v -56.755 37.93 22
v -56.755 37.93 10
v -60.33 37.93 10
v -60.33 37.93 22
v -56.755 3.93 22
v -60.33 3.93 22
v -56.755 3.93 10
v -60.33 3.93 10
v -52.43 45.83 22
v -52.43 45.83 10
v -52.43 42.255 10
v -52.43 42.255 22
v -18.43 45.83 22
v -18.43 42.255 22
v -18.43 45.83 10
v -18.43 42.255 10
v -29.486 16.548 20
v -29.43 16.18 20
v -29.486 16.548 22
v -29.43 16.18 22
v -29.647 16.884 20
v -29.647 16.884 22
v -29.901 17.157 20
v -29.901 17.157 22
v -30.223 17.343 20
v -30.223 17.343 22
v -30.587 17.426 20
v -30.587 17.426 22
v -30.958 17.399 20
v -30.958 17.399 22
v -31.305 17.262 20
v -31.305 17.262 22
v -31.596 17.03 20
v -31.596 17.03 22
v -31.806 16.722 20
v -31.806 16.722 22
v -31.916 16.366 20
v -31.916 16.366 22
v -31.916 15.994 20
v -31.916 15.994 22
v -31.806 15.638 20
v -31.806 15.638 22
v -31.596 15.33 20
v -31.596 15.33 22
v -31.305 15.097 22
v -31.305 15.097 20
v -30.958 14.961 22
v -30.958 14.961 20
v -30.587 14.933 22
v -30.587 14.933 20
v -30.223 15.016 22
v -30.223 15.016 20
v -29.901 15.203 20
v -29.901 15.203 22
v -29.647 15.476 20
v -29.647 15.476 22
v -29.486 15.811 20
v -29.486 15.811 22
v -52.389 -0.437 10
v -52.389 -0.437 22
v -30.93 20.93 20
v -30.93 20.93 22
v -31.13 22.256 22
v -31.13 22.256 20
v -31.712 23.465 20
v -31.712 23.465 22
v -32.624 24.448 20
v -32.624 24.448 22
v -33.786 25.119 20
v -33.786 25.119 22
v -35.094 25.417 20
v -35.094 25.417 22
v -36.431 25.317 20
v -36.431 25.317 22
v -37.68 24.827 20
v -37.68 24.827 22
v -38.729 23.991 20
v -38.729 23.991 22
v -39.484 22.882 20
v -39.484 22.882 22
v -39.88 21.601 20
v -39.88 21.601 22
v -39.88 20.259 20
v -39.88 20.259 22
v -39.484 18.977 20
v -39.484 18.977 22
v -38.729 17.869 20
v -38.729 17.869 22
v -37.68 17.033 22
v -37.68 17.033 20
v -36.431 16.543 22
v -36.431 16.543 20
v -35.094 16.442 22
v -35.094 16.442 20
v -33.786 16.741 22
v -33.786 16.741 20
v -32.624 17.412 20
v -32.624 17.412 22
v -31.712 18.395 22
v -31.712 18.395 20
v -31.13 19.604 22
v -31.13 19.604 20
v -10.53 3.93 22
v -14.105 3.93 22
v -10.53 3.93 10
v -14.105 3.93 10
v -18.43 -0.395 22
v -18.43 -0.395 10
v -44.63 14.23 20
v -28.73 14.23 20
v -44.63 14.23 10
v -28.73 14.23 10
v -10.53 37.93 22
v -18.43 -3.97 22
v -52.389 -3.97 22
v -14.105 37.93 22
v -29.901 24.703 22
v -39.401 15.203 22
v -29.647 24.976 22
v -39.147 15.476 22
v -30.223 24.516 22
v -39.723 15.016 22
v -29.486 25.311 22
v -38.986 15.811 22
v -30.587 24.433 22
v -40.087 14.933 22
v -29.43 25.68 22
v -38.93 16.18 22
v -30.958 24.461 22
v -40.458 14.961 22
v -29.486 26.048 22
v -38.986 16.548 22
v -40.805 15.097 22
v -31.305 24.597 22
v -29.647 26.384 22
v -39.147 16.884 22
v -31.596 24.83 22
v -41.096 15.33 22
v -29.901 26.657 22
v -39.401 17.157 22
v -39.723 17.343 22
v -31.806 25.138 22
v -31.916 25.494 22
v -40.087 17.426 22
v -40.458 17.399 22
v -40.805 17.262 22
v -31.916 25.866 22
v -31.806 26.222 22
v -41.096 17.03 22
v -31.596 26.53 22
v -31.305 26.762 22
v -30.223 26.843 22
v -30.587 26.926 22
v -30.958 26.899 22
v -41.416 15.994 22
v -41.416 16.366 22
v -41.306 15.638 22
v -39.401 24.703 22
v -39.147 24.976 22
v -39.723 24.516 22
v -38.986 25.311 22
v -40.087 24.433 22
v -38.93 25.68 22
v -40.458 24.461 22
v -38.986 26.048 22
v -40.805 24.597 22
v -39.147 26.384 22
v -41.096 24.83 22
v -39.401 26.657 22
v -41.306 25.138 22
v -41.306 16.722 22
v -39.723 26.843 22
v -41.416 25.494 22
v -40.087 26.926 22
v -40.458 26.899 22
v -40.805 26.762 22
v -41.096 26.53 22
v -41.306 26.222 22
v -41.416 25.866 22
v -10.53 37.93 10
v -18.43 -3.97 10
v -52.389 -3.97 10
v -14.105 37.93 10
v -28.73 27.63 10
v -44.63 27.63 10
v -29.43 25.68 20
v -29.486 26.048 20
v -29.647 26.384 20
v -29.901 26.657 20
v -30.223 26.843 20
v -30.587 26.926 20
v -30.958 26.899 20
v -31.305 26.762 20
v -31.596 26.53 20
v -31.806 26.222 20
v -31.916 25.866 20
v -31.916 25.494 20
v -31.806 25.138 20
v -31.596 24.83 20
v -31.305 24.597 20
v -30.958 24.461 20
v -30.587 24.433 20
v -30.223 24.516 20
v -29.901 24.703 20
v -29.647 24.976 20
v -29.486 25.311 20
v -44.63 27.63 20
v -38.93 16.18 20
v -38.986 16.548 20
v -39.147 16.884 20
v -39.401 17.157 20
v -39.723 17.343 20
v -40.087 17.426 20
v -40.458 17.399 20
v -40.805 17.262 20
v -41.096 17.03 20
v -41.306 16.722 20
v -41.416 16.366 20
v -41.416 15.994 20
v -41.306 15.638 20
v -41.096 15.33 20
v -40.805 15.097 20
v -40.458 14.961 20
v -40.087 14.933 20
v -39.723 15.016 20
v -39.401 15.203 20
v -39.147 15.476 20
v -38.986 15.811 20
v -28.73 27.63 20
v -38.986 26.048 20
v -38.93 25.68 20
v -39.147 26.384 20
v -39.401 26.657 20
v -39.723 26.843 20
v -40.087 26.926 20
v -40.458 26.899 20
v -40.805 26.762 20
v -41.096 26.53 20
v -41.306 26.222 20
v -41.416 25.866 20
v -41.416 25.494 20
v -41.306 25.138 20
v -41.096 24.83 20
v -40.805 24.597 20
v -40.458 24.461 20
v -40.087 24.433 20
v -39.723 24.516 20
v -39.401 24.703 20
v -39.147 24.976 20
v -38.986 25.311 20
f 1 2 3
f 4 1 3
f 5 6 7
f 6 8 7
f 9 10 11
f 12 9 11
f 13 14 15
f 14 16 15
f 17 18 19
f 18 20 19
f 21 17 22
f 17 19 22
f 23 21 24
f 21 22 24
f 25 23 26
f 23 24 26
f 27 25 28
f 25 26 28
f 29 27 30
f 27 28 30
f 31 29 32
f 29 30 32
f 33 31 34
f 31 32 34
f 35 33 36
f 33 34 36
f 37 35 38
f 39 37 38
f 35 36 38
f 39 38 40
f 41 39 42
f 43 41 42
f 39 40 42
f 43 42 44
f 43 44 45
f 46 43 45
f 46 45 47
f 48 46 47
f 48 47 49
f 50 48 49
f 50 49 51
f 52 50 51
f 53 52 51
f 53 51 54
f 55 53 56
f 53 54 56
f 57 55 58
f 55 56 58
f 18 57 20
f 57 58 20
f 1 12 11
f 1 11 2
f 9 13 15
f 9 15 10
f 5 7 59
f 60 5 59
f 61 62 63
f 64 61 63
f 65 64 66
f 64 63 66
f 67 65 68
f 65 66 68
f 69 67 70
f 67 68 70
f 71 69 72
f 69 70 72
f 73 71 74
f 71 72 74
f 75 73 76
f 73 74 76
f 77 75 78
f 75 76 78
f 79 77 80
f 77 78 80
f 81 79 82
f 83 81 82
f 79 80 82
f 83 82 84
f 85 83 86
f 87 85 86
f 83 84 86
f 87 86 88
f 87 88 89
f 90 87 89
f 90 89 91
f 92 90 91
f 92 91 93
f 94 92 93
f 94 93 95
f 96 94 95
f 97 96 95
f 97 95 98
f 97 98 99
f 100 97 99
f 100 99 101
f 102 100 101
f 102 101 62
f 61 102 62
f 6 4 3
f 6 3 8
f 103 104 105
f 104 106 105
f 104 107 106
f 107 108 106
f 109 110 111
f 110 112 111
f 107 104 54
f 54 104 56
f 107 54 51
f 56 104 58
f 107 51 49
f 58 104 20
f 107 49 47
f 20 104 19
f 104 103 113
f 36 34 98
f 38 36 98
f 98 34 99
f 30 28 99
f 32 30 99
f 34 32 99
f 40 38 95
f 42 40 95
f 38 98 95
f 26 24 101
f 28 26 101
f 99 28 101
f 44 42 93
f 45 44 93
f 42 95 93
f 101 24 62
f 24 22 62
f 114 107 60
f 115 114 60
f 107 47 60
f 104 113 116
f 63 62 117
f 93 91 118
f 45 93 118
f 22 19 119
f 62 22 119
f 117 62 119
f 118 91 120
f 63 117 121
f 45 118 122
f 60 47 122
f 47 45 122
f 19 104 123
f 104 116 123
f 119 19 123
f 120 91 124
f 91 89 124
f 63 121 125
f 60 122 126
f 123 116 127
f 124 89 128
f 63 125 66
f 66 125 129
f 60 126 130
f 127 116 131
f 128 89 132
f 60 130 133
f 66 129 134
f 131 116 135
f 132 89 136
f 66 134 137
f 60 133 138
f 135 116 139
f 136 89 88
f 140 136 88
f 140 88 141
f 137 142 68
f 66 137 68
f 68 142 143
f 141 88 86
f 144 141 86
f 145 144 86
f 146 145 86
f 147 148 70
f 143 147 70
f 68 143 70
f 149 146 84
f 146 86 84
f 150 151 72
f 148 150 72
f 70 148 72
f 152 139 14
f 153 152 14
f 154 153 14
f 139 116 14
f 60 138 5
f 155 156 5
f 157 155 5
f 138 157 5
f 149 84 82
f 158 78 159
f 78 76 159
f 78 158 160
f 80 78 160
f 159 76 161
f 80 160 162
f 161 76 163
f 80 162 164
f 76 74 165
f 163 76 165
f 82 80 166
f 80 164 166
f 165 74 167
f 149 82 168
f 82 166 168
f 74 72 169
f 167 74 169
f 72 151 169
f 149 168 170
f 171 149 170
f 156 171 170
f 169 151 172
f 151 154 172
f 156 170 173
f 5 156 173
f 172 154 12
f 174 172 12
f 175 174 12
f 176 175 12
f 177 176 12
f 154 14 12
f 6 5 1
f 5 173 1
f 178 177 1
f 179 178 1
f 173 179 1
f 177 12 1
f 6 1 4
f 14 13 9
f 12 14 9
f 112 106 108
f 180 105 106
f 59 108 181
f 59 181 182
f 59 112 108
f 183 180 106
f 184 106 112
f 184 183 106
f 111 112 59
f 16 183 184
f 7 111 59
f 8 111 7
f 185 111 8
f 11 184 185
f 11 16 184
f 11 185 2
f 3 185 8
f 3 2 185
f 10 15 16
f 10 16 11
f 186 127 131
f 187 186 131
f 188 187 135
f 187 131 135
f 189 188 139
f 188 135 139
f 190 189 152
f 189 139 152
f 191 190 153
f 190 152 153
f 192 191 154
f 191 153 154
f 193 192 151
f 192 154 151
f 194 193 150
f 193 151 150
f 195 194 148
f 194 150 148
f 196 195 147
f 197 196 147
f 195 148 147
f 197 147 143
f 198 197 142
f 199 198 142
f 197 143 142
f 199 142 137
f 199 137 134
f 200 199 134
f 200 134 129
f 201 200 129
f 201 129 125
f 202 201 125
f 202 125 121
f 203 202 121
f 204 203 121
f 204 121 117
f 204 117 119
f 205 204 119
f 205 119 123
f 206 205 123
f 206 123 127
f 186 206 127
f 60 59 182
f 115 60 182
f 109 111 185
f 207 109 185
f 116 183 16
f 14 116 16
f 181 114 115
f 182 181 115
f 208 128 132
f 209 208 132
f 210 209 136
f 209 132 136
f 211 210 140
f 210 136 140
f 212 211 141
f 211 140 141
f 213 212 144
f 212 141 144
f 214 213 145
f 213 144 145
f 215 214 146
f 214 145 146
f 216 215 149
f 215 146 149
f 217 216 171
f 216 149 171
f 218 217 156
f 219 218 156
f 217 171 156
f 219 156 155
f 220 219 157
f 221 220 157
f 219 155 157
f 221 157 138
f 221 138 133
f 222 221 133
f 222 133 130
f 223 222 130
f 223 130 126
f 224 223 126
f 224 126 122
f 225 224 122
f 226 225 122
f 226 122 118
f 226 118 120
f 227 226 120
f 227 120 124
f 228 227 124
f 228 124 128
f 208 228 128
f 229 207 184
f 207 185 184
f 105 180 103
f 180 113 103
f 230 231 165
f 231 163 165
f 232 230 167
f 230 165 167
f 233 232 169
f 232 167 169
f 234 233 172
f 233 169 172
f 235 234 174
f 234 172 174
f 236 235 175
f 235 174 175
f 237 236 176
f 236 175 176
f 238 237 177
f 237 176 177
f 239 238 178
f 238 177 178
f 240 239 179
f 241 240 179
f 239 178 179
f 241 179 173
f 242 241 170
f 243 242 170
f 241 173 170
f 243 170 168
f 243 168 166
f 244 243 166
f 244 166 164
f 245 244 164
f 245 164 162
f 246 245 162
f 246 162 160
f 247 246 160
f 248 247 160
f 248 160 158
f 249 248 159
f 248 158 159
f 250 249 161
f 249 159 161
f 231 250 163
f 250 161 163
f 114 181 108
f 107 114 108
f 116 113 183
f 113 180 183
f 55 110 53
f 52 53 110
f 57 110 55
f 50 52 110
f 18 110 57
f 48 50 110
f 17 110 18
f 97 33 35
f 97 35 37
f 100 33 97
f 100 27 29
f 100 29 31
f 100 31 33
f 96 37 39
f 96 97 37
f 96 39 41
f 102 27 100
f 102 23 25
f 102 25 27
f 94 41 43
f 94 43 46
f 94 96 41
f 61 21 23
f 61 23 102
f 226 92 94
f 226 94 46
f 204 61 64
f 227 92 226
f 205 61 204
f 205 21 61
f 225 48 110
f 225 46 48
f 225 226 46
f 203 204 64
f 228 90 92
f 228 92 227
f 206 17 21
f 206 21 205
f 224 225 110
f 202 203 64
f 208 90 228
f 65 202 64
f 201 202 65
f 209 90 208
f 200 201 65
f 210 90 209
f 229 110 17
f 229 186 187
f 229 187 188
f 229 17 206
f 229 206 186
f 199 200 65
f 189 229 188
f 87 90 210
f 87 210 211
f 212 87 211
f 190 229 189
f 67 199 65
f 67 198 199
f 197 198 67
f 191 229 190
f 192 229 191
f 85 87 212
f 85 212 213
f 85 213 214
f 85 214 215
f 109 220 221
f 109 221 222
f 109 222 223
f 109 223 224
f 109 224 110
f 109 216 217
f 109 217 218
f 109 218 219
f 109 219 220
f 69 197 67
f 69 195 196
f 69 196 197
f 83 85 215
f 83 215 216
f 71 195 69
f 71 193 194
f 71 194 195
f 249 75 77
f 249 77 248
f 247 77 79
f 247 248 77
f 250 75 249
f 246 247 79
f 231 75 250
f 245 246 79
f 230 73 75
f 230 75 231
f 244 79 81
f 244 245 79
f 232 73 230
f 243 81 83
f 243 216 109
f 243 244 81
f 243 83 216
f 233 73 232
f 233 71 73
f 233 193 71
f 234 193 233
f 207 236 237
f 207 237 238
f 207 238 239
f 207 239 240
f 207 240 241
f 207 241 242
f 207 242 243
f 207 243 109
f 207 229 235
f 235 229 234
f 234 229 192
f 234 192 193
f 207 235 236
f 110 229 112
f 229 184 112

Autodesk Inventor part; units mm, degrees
ref_plane "YZ Plane" through (0, 0, 0) normal (1, 0, 0) x (0, 1, 0)
ref_plane "XZ Plane" through (0, 0, 0) normal (0, 1, 0) x (-1, 0, 0)
ref_plane "Work Plane1" through (-56.3599, 0, 22) normal (0, 0, -1) x (-1, 0, 0)
sketch "Sketch1" plane through (-56.3599, 0, 22) normal (0, 0, -1) x (-1, 0, 0)
  line L0 (-4.0299, -0.3538) -> (-2.2322, 1.4439) construction
  arc A0 (-1.4439, 2.2322) -> (-2.2322, 1.4439) centre (-0.9299, 0.9299) ccw construction
  line L1 (-1.4439, 2.2322) -> (0.3538, 4.0299) construction
  line L2 (-37.8299, 42.8299) -> (-37.8299, 37.8299) construction
  line L3 (-37.8299, 37.8299) -> (-42.9208, 37.8299) construction
  line L4 (-37.8299, 42.2137) -> (-37.8299, 45.8299) construction
  line L5 (-37.8299, 45.8299) -> (-4.0299, 45.8299) construction
  line L6 (-4.0299, 45.8299) -> (-4.0299, 42.2137) construction
  line L7 (-4.0299, 4.0299) -> (0.3538, 4.0299) projected
  circle A1 centre (-20.9299, 20.9299) radius 17.5 projected
  line L8 (-20.9299, 58.9723) -> (17.1124, 20.9299) construction
  line L9 (17.1124, 20.9299) -> (-20.9299, -17.1124) construction
  line L10 (-20.9299, -17.1124) -> (-58.9723, 20.9299) construction
  line L11 (-58.9723, 20.9299) -> (-20.9299, 58.9723) construction
  line L12 (-20.9299, 58.9723) -> (-20.9299, -17.1124) construction
  line L13 (17.1124, 20.9299) -> (-58.9723, 20.9299) construction
  line L14 (-20.9299, 58.9723) -> (32.8701, 58.9723) construction
  line L15 (-43.4299, 43.4299) -> (1.5701, 43.4299) construction
  line L16 (1.5701, 43.4299) -> (1.5701, -1.5701) construction
  line L17 (1.5701, -1.5701) -> (-43.4299, -1.5701) construction
  line L18 (-43.4299, -1.5701) -> (-43.4299, 43.4299) construction
  line L19 (-43.4299, 43.4299) -> (1.5701, -1.5701) construction
  line L20 (1.5701, 43.4299) -> (-43.4299, -1.5701) construction
  line L21 (-43.4299, 5.3876) -> (-43.4299, 36.4723)
  line L22 (-43.4299, 36.4723) -> (-36.4723, 43.4299)
  line L23 (-36.4723, 43.4299) -> (-5.3876, 43.4299)
  line L24 (-5.3876, 43.4299) -> (1.5701, 36.4723)
  line L25 (1.5701, 36.4723) -> (1.5701, 5.3876)
  line L26 (1.5701, 5.3876) -> (-5.3876, -1.5701)
  line L27 (-5.3876, -1.5701) -> (-36.4723, -1.5701)
  line L28 (-36.4723, -1.5701) -> (-43.4299, 5.3876)
  line L29 (-4.0299, 42.2137) -> (-37.8299, 42.2137) projected
  line L30 (-4.0299, -0.3538) -> (-4.0299, 4.0299) projected
  circle A2 centre (-20.9299, 20.9299) radius 1.5
  line L31 (-10.9299, 10.9299) -> (-30.9299, 10.9299) construction
  line L32 (-30.9299, 10.9299) -> (-30.9299, 30.9299) construction
  line L33 (-30.9299, 30.9299) -> (-10.9299, 30.9299) construction
  line L34 (-10.9299, 30.9299) -> (-10.9299, 10.9299) construction
  line L35 (-10.9299, 10.9299) -> (-30.9299, 30.9299) construction
  line L36 (-30.9299, 10.9299) -> (-10.9299, 30.9299) construction
  circle A3 centre (-30.9299, 30.9299) radius 1.4
  circle A4 centre (-30.9299, 10.9299) radius 1.4
  circle A5 centre (-10.9299, 10.9299) radius 1.4
  line L37 (-45.8299, 37.8299) -> (-42.0723, 37.8299) construction
  line L38 (-42.1723, 37.7299) -> (-45.8299, 37.7299)
  line L39 (-45.8299, 37.7299) -> (-45.8299, 4.1299)
  line L40 (-45.8299, 4.1299) -> (-42.1723, 4.1299)
  line L41 (-42.1723, 4.1299) -> (-42.1723, 37.7299)
  line L42 (-45.8299, 4.0299) -> (-42.0723, 4.0299) construction
  line L43 (-45.8299, 37.8299) -> (-42.0723, 37.8299) projected
  line L44 (-37.7299, 45.8299) -> (-4.1299, 45.8299)
  line L45 (-4.1299, 45.8299) -> (-4.1299, 42.1723)
  line L46 (-4.1299, 42.1723) -> (-37.7299, 42.1723)
  line L47 (-37.7299, 42.1723) -> (-37.7299, 45.8299)
  line L48 (0.4701, 37.8299) -> (0.4701, 4.0299) construction
  line L49 (0.4701, 4.0299) -> (3.9701, 4.0299) construction
  line L50 (3.9701, 37.8299) -> (3.9701, 4.0299) construction
  line L51 (0.4701, 37.8299) -> (3.9701, 37.8299) construction
  line L52 (-45.8299, -3.9701) -> (-4.0299, -3.9701) construction
  line L53 (0.3124, 37.7299) -> (3.9701, 37.7299)
  line L54 (3.9701, 37.7299) -> (3.9701, 4.1299)
  line L55 (3.9701, 4.1299) -> (0.3124, 4.1299)
  line L56 (0.3124, 4.1299) -> (0.3124, 37.7299)
  line L57 (-4.1713, -0.3538) -> (-37.7299, -0.3538)
  line L58 (-37.7299, -0.3538) -> (-37.7299, -3.9701)
  line L59 (-37.7299, -3.9701) -> (-4.1713, -3.9701)
  line L60 (-4.1713, -3.9701) -> (-4.1713, -0.3538)
  point P0 (-37.8299, 4.0299)
  dimension "d18" = 53.8
  dimension "d19" = 45
  dimension "d20" = 53.8
  dimension "d21" = 45
  dimension "d22" = 45
  dimension "d30" = 20
  dimension "d31" = 20
  dimension "d32" = 2.8
  dimension "d33" = 2.8
  dimension "d34" = 2.8
  dimension "d35" = 3
  dimension "d36" = 0.1
  dimension "d37" = 0.1
  dimension "d38" = 0.1
  dimension "d39" = 0.1
extrude "Extrusion1" add sketch "Sketch1" along normal blind 12 contours L30 L26 L57 L28 L41 L22 L46 L24 L56 L7 | L7 L26 L30 | L56 L24 L25 L26 | L26 L25 L24 L53 L54 L55 | L60 L59 L58 L57 L28 L27 L26 | L26 L27 L28 L57 | L46 L22 L29 L24 | L24 L29 L45 | L40 L39 L38 L22 L21 L28 | L28 L21 L22 L41 | L29 L22 L23 L24 | L24 L23 L22 L29 L47 L44 L45 | L47 L29 L22 | A1 | A2 | A3 | A4 | A5
sketch "Skizze4" plane through (-56.3599, 0, 10) normal (0, 0, -1) x (-1, 0, 0)
  line L0 (-37.7299, 42.1723) -> (-42.1723, 37.7299) projected
  line L1 (-42.1723, 37.7299) -> (-45.8299, 37.7299) projected
  line L2 (-45.8299, 37.7299) -> (-45.8299, 4.1299) construction
  line L3 (-45.8299, 4.1299) -> (-42.1723, 4.1299) projected
  line L4 (-42.1723, 4.1299) -> (-37.6885, -0.3538) projected
  line L5 (-37.6885, -0.3538) -> (-37.7299, -0.3538) projected
  line L6 (-37.7299, -0.3538) -> (-37.7299, -3.9701) projected
  line L7 (-37.7299, -3.9701) -> (-4.1713, -3.9701) construction
  line L8 (-4.1713, -3.9701) -> (-4.1713, -0.3538) projected
  line L9 (-4.1713, -0.3538) -> (0.3124, 4.1299) projected
  line L10 (0.3124, 4.1299) -> (3.9701, 4.1299) projected
  line L11 (3.9701, 4.1299) -> (3.9701, 37.7299) construction
  line L12 (3.9701, 37.7299) -> (0.3124, 37.7299) projected
  line L13 (0.3124, 37.7299) -> (-4.1299, 42.1723) projected
  line L14 (-4.1299, 42.1723) -> (-4.1299, 45.8299) projected
  line L15 (-4.1299, 45.8299) -> (-37.7299, 45.8299) construction
  line L16 (-37.7299, 45.8299) -> (-37.7299, 42.1723) projected
  line L17 (-37.9299, 46.0299) -> (-3.9299, 46.0299) construction
  line L18 (-3.9299, 46.0299) -> (-3.9299, 42.2551)
  line L19 (-3.9299, 42.2551) -> (0.3953, 37.9299)
  line L20 (0.3953, 37.9299) -> (4.1701, 37.9299)
  line L21 (4.1701, 37.9299) -> (4.1701, 3.9299) construction
  line L22 (4.1701, 3.9299) -> (0.3953, 3.9299)
  line L23 (0.3953, 3.9299) -> (-3.9713, -0.4367)
  line L24 (-3.9713, -0.4367) -> (-3.9713, -4.1701)
  line L25 (-3.9713, -4.1701) -> (-37.9299, -4.1701) construction
  line L26 (-37.9299, -4.1701) -> (-37.9299, -0.3953)
  line L27 (-37.9299, -0.3953) -> (-42.2551, 3.9299)
  line L28 (-42.2551, 3.9299) -> (-46.0299, 3.9299)
  line L29 (-46.0299, 3.9299) -> (-46.0299, 37.9299) construction
  line L30 (-46.0299, 37.9299) -> (-42.2551, 37.9299)
  line L31 (-42.2551, 37.9299) -> (-37.9299, 42.2551)
  line L32 (-37.9299, 42.2551) -> (-37.9299, 46.0299)
  line L33 (-45.8299, 37.7299) -> (-45.8299, 37.9299)
  line L34 (-4.1299, 45.8299) -> (-37.7299, 45.8299) projected
  line L35 (-37.7299, 45.8299) -> (-37.9299, 45.8299)
  line L36 (-4.1299, 45.8299) -> (-3.9299, 45.8299)
  line L37 (3.9701, 37.7299) -> (3.9701, 37.9299)
  line L38 (3.9701, 4.1299) -> (3.9701, 37.7299) projected
  line L39 (3.9701, 4.1299) -> (3.9701, 3.9299)
  line L40 (-4.1713, -3.9701) -> (-3.9713, -3.9701)
  line L41 (-37.7299, -3.9701) -> (-37.9299, -3.9701)
  line L42 (-45.8299, 4.1299) -> (-45.8299, 3.9299)
  point P0 (-56.3599, 0)
  dimension "d40" = 0.2
extrude "IM_offset" add sketch "Skizze4" against normal up to surface (12 mm away)
ref_plane "Arbeitsebene5" through (-35.4299, 3.9299, 22) normal (-1, 0, 0) x (0, 0, 1)
ref_plane "Arbeitsebene6" through (-18.4299, 20.9299, 22) normal (0, 1, 0) x (-1, 0, 0)
sketch "Skizze31" plane through (-56.3599, 0, 10) normal (0, 0, -1) x (-1, 0, 0)
  line L0 (3.9701, 3.9299) -> (3.9701, 37.9299) projected
  line L1 (3.9701, 37.9299) -> (0.3953, 37.9299) projected
  line L2 (0.3953, 37.9299) -> (-3.9299, 42.2551) projected
  line L3 (-3.9299, 42.2551) -> (-3.9299, 45.8299) projected
  line L4 (-3.9299, 45.8299) -> (-37.9299, 45.8299) projected
  line L5 (-37.9299, 45.8299) -> (-37.9299, 42.2551) projected
  line L6 (-37.9299, 42.2551) -> (-42.2551, 37.9299) projected
  line L7 (-42.2551, 37.9299) -> (-45.8299, 37.9299) projected
  line L8 (-45.8299, 37.9299) -> (-45.8299, 3.9299) projected
  line L9 (-42.2551, 3.9299) -> (-45.8299, 3.9299) projected
  line L10 (-37.9299, -0.3953) -> (-42.2551, 3.9299) projected
  line L11 (-37.9299, -3.9701) -> (-37.9299, -0.3953) projected
  line L12 (-3.9713, -3.9701) -> (-37.9299, -3.9701) projected
  line L13 (-3.9713, -3.9701) -> (-3.9713, -0.4367) projected
  line L14 (-3.9713, -0.4367) -> (0.3953, 3.9299) projected
  line L15 (0.3953, 3.9299) -> (3.9701, 3.9299) projected
  line L16 (-11.9299, 27.4299) -> (-27.4299, 27.4299) projected
  line L17 (-11.9299, 14.4299) -> (-11.9299, 27.4299) projected
  line L18 (-27.4299, 14.4299) -> (-11.9299, 14.4299) projected
  line L19 (-27.4299, 27.4299) -> (-27.4299, 14.4299) projected
  circle A0 centre (-20.9299, 20.9299) radius 4.5 projected
  circle A1 centre (-25.6799, 25.6799) radius 0.75 projected
  circle A2 centre (-25.6799, 16.1799) radius 0.75 projected
  circle A3 centre (-16.1799, 16.1799) radius 0.75 projected
  circle A4 centre (-16.1799, 25.6799) radius 0.75 projected
  line L20 (-27.6299, 14.2299) -> (-11.7299, 14.2299)
  line L21 (-11.7299, 14.2299) -> (-11.7299, 27.6299)
  line L22 (-11.7299, 27.6299) -> (-27.6299, 27.6299)
  line L23 (-27.6299, 27.6299) -> (-27.6299, 14.2299)
  point P0 (-56.3599, 0)
  dimension "d184" = 0.2
extrude "Extrusion26" cut sketch "Skizze31" against normal blind 10 contours L17 L18 L19 L16 | A0 | A1 | A2 | A3 | A4 | L23 L22 L21 L20
sketch "Skizze32" plane through (-56.3599, 0, 22) normal (0, 0, 1) x (1, 0, 0)
  circle A0 centre (20.9299, 20.9299) radius 4.5 projected
  circle A1 centre (25.6799, 25.6799) radius 1.25 projected
  circle A2 centre (16.1799, 16.1799) radius 1.25 projected
  circle A3 centre (25.6799, 16.1799) radius 1.25 projected
  circle A4 centre (16.1799, 25.6799) radius 1.25 projected
  line L0 (14.4299, 27.4299) -> (27.4299, 27.4299) projected
  line L1 (27.4299, 27.4299) -> (27.4299, 14.4299) projected
  line L2 (27.4299, 14.4299) -> (14.4299, 14.4299) projected
  line L3 (14.4299, 14.4299) -> (14.4299, 27.4299) projected
  point P0 (56.3599, 0)
extrude "Extrusion27" cut sketch "Skizze32" against normal blind 10 contours A0 | A1 | A2 | A3 | A4
properties part number "20_Cube_Insert_Lasertack_mount_v3"
